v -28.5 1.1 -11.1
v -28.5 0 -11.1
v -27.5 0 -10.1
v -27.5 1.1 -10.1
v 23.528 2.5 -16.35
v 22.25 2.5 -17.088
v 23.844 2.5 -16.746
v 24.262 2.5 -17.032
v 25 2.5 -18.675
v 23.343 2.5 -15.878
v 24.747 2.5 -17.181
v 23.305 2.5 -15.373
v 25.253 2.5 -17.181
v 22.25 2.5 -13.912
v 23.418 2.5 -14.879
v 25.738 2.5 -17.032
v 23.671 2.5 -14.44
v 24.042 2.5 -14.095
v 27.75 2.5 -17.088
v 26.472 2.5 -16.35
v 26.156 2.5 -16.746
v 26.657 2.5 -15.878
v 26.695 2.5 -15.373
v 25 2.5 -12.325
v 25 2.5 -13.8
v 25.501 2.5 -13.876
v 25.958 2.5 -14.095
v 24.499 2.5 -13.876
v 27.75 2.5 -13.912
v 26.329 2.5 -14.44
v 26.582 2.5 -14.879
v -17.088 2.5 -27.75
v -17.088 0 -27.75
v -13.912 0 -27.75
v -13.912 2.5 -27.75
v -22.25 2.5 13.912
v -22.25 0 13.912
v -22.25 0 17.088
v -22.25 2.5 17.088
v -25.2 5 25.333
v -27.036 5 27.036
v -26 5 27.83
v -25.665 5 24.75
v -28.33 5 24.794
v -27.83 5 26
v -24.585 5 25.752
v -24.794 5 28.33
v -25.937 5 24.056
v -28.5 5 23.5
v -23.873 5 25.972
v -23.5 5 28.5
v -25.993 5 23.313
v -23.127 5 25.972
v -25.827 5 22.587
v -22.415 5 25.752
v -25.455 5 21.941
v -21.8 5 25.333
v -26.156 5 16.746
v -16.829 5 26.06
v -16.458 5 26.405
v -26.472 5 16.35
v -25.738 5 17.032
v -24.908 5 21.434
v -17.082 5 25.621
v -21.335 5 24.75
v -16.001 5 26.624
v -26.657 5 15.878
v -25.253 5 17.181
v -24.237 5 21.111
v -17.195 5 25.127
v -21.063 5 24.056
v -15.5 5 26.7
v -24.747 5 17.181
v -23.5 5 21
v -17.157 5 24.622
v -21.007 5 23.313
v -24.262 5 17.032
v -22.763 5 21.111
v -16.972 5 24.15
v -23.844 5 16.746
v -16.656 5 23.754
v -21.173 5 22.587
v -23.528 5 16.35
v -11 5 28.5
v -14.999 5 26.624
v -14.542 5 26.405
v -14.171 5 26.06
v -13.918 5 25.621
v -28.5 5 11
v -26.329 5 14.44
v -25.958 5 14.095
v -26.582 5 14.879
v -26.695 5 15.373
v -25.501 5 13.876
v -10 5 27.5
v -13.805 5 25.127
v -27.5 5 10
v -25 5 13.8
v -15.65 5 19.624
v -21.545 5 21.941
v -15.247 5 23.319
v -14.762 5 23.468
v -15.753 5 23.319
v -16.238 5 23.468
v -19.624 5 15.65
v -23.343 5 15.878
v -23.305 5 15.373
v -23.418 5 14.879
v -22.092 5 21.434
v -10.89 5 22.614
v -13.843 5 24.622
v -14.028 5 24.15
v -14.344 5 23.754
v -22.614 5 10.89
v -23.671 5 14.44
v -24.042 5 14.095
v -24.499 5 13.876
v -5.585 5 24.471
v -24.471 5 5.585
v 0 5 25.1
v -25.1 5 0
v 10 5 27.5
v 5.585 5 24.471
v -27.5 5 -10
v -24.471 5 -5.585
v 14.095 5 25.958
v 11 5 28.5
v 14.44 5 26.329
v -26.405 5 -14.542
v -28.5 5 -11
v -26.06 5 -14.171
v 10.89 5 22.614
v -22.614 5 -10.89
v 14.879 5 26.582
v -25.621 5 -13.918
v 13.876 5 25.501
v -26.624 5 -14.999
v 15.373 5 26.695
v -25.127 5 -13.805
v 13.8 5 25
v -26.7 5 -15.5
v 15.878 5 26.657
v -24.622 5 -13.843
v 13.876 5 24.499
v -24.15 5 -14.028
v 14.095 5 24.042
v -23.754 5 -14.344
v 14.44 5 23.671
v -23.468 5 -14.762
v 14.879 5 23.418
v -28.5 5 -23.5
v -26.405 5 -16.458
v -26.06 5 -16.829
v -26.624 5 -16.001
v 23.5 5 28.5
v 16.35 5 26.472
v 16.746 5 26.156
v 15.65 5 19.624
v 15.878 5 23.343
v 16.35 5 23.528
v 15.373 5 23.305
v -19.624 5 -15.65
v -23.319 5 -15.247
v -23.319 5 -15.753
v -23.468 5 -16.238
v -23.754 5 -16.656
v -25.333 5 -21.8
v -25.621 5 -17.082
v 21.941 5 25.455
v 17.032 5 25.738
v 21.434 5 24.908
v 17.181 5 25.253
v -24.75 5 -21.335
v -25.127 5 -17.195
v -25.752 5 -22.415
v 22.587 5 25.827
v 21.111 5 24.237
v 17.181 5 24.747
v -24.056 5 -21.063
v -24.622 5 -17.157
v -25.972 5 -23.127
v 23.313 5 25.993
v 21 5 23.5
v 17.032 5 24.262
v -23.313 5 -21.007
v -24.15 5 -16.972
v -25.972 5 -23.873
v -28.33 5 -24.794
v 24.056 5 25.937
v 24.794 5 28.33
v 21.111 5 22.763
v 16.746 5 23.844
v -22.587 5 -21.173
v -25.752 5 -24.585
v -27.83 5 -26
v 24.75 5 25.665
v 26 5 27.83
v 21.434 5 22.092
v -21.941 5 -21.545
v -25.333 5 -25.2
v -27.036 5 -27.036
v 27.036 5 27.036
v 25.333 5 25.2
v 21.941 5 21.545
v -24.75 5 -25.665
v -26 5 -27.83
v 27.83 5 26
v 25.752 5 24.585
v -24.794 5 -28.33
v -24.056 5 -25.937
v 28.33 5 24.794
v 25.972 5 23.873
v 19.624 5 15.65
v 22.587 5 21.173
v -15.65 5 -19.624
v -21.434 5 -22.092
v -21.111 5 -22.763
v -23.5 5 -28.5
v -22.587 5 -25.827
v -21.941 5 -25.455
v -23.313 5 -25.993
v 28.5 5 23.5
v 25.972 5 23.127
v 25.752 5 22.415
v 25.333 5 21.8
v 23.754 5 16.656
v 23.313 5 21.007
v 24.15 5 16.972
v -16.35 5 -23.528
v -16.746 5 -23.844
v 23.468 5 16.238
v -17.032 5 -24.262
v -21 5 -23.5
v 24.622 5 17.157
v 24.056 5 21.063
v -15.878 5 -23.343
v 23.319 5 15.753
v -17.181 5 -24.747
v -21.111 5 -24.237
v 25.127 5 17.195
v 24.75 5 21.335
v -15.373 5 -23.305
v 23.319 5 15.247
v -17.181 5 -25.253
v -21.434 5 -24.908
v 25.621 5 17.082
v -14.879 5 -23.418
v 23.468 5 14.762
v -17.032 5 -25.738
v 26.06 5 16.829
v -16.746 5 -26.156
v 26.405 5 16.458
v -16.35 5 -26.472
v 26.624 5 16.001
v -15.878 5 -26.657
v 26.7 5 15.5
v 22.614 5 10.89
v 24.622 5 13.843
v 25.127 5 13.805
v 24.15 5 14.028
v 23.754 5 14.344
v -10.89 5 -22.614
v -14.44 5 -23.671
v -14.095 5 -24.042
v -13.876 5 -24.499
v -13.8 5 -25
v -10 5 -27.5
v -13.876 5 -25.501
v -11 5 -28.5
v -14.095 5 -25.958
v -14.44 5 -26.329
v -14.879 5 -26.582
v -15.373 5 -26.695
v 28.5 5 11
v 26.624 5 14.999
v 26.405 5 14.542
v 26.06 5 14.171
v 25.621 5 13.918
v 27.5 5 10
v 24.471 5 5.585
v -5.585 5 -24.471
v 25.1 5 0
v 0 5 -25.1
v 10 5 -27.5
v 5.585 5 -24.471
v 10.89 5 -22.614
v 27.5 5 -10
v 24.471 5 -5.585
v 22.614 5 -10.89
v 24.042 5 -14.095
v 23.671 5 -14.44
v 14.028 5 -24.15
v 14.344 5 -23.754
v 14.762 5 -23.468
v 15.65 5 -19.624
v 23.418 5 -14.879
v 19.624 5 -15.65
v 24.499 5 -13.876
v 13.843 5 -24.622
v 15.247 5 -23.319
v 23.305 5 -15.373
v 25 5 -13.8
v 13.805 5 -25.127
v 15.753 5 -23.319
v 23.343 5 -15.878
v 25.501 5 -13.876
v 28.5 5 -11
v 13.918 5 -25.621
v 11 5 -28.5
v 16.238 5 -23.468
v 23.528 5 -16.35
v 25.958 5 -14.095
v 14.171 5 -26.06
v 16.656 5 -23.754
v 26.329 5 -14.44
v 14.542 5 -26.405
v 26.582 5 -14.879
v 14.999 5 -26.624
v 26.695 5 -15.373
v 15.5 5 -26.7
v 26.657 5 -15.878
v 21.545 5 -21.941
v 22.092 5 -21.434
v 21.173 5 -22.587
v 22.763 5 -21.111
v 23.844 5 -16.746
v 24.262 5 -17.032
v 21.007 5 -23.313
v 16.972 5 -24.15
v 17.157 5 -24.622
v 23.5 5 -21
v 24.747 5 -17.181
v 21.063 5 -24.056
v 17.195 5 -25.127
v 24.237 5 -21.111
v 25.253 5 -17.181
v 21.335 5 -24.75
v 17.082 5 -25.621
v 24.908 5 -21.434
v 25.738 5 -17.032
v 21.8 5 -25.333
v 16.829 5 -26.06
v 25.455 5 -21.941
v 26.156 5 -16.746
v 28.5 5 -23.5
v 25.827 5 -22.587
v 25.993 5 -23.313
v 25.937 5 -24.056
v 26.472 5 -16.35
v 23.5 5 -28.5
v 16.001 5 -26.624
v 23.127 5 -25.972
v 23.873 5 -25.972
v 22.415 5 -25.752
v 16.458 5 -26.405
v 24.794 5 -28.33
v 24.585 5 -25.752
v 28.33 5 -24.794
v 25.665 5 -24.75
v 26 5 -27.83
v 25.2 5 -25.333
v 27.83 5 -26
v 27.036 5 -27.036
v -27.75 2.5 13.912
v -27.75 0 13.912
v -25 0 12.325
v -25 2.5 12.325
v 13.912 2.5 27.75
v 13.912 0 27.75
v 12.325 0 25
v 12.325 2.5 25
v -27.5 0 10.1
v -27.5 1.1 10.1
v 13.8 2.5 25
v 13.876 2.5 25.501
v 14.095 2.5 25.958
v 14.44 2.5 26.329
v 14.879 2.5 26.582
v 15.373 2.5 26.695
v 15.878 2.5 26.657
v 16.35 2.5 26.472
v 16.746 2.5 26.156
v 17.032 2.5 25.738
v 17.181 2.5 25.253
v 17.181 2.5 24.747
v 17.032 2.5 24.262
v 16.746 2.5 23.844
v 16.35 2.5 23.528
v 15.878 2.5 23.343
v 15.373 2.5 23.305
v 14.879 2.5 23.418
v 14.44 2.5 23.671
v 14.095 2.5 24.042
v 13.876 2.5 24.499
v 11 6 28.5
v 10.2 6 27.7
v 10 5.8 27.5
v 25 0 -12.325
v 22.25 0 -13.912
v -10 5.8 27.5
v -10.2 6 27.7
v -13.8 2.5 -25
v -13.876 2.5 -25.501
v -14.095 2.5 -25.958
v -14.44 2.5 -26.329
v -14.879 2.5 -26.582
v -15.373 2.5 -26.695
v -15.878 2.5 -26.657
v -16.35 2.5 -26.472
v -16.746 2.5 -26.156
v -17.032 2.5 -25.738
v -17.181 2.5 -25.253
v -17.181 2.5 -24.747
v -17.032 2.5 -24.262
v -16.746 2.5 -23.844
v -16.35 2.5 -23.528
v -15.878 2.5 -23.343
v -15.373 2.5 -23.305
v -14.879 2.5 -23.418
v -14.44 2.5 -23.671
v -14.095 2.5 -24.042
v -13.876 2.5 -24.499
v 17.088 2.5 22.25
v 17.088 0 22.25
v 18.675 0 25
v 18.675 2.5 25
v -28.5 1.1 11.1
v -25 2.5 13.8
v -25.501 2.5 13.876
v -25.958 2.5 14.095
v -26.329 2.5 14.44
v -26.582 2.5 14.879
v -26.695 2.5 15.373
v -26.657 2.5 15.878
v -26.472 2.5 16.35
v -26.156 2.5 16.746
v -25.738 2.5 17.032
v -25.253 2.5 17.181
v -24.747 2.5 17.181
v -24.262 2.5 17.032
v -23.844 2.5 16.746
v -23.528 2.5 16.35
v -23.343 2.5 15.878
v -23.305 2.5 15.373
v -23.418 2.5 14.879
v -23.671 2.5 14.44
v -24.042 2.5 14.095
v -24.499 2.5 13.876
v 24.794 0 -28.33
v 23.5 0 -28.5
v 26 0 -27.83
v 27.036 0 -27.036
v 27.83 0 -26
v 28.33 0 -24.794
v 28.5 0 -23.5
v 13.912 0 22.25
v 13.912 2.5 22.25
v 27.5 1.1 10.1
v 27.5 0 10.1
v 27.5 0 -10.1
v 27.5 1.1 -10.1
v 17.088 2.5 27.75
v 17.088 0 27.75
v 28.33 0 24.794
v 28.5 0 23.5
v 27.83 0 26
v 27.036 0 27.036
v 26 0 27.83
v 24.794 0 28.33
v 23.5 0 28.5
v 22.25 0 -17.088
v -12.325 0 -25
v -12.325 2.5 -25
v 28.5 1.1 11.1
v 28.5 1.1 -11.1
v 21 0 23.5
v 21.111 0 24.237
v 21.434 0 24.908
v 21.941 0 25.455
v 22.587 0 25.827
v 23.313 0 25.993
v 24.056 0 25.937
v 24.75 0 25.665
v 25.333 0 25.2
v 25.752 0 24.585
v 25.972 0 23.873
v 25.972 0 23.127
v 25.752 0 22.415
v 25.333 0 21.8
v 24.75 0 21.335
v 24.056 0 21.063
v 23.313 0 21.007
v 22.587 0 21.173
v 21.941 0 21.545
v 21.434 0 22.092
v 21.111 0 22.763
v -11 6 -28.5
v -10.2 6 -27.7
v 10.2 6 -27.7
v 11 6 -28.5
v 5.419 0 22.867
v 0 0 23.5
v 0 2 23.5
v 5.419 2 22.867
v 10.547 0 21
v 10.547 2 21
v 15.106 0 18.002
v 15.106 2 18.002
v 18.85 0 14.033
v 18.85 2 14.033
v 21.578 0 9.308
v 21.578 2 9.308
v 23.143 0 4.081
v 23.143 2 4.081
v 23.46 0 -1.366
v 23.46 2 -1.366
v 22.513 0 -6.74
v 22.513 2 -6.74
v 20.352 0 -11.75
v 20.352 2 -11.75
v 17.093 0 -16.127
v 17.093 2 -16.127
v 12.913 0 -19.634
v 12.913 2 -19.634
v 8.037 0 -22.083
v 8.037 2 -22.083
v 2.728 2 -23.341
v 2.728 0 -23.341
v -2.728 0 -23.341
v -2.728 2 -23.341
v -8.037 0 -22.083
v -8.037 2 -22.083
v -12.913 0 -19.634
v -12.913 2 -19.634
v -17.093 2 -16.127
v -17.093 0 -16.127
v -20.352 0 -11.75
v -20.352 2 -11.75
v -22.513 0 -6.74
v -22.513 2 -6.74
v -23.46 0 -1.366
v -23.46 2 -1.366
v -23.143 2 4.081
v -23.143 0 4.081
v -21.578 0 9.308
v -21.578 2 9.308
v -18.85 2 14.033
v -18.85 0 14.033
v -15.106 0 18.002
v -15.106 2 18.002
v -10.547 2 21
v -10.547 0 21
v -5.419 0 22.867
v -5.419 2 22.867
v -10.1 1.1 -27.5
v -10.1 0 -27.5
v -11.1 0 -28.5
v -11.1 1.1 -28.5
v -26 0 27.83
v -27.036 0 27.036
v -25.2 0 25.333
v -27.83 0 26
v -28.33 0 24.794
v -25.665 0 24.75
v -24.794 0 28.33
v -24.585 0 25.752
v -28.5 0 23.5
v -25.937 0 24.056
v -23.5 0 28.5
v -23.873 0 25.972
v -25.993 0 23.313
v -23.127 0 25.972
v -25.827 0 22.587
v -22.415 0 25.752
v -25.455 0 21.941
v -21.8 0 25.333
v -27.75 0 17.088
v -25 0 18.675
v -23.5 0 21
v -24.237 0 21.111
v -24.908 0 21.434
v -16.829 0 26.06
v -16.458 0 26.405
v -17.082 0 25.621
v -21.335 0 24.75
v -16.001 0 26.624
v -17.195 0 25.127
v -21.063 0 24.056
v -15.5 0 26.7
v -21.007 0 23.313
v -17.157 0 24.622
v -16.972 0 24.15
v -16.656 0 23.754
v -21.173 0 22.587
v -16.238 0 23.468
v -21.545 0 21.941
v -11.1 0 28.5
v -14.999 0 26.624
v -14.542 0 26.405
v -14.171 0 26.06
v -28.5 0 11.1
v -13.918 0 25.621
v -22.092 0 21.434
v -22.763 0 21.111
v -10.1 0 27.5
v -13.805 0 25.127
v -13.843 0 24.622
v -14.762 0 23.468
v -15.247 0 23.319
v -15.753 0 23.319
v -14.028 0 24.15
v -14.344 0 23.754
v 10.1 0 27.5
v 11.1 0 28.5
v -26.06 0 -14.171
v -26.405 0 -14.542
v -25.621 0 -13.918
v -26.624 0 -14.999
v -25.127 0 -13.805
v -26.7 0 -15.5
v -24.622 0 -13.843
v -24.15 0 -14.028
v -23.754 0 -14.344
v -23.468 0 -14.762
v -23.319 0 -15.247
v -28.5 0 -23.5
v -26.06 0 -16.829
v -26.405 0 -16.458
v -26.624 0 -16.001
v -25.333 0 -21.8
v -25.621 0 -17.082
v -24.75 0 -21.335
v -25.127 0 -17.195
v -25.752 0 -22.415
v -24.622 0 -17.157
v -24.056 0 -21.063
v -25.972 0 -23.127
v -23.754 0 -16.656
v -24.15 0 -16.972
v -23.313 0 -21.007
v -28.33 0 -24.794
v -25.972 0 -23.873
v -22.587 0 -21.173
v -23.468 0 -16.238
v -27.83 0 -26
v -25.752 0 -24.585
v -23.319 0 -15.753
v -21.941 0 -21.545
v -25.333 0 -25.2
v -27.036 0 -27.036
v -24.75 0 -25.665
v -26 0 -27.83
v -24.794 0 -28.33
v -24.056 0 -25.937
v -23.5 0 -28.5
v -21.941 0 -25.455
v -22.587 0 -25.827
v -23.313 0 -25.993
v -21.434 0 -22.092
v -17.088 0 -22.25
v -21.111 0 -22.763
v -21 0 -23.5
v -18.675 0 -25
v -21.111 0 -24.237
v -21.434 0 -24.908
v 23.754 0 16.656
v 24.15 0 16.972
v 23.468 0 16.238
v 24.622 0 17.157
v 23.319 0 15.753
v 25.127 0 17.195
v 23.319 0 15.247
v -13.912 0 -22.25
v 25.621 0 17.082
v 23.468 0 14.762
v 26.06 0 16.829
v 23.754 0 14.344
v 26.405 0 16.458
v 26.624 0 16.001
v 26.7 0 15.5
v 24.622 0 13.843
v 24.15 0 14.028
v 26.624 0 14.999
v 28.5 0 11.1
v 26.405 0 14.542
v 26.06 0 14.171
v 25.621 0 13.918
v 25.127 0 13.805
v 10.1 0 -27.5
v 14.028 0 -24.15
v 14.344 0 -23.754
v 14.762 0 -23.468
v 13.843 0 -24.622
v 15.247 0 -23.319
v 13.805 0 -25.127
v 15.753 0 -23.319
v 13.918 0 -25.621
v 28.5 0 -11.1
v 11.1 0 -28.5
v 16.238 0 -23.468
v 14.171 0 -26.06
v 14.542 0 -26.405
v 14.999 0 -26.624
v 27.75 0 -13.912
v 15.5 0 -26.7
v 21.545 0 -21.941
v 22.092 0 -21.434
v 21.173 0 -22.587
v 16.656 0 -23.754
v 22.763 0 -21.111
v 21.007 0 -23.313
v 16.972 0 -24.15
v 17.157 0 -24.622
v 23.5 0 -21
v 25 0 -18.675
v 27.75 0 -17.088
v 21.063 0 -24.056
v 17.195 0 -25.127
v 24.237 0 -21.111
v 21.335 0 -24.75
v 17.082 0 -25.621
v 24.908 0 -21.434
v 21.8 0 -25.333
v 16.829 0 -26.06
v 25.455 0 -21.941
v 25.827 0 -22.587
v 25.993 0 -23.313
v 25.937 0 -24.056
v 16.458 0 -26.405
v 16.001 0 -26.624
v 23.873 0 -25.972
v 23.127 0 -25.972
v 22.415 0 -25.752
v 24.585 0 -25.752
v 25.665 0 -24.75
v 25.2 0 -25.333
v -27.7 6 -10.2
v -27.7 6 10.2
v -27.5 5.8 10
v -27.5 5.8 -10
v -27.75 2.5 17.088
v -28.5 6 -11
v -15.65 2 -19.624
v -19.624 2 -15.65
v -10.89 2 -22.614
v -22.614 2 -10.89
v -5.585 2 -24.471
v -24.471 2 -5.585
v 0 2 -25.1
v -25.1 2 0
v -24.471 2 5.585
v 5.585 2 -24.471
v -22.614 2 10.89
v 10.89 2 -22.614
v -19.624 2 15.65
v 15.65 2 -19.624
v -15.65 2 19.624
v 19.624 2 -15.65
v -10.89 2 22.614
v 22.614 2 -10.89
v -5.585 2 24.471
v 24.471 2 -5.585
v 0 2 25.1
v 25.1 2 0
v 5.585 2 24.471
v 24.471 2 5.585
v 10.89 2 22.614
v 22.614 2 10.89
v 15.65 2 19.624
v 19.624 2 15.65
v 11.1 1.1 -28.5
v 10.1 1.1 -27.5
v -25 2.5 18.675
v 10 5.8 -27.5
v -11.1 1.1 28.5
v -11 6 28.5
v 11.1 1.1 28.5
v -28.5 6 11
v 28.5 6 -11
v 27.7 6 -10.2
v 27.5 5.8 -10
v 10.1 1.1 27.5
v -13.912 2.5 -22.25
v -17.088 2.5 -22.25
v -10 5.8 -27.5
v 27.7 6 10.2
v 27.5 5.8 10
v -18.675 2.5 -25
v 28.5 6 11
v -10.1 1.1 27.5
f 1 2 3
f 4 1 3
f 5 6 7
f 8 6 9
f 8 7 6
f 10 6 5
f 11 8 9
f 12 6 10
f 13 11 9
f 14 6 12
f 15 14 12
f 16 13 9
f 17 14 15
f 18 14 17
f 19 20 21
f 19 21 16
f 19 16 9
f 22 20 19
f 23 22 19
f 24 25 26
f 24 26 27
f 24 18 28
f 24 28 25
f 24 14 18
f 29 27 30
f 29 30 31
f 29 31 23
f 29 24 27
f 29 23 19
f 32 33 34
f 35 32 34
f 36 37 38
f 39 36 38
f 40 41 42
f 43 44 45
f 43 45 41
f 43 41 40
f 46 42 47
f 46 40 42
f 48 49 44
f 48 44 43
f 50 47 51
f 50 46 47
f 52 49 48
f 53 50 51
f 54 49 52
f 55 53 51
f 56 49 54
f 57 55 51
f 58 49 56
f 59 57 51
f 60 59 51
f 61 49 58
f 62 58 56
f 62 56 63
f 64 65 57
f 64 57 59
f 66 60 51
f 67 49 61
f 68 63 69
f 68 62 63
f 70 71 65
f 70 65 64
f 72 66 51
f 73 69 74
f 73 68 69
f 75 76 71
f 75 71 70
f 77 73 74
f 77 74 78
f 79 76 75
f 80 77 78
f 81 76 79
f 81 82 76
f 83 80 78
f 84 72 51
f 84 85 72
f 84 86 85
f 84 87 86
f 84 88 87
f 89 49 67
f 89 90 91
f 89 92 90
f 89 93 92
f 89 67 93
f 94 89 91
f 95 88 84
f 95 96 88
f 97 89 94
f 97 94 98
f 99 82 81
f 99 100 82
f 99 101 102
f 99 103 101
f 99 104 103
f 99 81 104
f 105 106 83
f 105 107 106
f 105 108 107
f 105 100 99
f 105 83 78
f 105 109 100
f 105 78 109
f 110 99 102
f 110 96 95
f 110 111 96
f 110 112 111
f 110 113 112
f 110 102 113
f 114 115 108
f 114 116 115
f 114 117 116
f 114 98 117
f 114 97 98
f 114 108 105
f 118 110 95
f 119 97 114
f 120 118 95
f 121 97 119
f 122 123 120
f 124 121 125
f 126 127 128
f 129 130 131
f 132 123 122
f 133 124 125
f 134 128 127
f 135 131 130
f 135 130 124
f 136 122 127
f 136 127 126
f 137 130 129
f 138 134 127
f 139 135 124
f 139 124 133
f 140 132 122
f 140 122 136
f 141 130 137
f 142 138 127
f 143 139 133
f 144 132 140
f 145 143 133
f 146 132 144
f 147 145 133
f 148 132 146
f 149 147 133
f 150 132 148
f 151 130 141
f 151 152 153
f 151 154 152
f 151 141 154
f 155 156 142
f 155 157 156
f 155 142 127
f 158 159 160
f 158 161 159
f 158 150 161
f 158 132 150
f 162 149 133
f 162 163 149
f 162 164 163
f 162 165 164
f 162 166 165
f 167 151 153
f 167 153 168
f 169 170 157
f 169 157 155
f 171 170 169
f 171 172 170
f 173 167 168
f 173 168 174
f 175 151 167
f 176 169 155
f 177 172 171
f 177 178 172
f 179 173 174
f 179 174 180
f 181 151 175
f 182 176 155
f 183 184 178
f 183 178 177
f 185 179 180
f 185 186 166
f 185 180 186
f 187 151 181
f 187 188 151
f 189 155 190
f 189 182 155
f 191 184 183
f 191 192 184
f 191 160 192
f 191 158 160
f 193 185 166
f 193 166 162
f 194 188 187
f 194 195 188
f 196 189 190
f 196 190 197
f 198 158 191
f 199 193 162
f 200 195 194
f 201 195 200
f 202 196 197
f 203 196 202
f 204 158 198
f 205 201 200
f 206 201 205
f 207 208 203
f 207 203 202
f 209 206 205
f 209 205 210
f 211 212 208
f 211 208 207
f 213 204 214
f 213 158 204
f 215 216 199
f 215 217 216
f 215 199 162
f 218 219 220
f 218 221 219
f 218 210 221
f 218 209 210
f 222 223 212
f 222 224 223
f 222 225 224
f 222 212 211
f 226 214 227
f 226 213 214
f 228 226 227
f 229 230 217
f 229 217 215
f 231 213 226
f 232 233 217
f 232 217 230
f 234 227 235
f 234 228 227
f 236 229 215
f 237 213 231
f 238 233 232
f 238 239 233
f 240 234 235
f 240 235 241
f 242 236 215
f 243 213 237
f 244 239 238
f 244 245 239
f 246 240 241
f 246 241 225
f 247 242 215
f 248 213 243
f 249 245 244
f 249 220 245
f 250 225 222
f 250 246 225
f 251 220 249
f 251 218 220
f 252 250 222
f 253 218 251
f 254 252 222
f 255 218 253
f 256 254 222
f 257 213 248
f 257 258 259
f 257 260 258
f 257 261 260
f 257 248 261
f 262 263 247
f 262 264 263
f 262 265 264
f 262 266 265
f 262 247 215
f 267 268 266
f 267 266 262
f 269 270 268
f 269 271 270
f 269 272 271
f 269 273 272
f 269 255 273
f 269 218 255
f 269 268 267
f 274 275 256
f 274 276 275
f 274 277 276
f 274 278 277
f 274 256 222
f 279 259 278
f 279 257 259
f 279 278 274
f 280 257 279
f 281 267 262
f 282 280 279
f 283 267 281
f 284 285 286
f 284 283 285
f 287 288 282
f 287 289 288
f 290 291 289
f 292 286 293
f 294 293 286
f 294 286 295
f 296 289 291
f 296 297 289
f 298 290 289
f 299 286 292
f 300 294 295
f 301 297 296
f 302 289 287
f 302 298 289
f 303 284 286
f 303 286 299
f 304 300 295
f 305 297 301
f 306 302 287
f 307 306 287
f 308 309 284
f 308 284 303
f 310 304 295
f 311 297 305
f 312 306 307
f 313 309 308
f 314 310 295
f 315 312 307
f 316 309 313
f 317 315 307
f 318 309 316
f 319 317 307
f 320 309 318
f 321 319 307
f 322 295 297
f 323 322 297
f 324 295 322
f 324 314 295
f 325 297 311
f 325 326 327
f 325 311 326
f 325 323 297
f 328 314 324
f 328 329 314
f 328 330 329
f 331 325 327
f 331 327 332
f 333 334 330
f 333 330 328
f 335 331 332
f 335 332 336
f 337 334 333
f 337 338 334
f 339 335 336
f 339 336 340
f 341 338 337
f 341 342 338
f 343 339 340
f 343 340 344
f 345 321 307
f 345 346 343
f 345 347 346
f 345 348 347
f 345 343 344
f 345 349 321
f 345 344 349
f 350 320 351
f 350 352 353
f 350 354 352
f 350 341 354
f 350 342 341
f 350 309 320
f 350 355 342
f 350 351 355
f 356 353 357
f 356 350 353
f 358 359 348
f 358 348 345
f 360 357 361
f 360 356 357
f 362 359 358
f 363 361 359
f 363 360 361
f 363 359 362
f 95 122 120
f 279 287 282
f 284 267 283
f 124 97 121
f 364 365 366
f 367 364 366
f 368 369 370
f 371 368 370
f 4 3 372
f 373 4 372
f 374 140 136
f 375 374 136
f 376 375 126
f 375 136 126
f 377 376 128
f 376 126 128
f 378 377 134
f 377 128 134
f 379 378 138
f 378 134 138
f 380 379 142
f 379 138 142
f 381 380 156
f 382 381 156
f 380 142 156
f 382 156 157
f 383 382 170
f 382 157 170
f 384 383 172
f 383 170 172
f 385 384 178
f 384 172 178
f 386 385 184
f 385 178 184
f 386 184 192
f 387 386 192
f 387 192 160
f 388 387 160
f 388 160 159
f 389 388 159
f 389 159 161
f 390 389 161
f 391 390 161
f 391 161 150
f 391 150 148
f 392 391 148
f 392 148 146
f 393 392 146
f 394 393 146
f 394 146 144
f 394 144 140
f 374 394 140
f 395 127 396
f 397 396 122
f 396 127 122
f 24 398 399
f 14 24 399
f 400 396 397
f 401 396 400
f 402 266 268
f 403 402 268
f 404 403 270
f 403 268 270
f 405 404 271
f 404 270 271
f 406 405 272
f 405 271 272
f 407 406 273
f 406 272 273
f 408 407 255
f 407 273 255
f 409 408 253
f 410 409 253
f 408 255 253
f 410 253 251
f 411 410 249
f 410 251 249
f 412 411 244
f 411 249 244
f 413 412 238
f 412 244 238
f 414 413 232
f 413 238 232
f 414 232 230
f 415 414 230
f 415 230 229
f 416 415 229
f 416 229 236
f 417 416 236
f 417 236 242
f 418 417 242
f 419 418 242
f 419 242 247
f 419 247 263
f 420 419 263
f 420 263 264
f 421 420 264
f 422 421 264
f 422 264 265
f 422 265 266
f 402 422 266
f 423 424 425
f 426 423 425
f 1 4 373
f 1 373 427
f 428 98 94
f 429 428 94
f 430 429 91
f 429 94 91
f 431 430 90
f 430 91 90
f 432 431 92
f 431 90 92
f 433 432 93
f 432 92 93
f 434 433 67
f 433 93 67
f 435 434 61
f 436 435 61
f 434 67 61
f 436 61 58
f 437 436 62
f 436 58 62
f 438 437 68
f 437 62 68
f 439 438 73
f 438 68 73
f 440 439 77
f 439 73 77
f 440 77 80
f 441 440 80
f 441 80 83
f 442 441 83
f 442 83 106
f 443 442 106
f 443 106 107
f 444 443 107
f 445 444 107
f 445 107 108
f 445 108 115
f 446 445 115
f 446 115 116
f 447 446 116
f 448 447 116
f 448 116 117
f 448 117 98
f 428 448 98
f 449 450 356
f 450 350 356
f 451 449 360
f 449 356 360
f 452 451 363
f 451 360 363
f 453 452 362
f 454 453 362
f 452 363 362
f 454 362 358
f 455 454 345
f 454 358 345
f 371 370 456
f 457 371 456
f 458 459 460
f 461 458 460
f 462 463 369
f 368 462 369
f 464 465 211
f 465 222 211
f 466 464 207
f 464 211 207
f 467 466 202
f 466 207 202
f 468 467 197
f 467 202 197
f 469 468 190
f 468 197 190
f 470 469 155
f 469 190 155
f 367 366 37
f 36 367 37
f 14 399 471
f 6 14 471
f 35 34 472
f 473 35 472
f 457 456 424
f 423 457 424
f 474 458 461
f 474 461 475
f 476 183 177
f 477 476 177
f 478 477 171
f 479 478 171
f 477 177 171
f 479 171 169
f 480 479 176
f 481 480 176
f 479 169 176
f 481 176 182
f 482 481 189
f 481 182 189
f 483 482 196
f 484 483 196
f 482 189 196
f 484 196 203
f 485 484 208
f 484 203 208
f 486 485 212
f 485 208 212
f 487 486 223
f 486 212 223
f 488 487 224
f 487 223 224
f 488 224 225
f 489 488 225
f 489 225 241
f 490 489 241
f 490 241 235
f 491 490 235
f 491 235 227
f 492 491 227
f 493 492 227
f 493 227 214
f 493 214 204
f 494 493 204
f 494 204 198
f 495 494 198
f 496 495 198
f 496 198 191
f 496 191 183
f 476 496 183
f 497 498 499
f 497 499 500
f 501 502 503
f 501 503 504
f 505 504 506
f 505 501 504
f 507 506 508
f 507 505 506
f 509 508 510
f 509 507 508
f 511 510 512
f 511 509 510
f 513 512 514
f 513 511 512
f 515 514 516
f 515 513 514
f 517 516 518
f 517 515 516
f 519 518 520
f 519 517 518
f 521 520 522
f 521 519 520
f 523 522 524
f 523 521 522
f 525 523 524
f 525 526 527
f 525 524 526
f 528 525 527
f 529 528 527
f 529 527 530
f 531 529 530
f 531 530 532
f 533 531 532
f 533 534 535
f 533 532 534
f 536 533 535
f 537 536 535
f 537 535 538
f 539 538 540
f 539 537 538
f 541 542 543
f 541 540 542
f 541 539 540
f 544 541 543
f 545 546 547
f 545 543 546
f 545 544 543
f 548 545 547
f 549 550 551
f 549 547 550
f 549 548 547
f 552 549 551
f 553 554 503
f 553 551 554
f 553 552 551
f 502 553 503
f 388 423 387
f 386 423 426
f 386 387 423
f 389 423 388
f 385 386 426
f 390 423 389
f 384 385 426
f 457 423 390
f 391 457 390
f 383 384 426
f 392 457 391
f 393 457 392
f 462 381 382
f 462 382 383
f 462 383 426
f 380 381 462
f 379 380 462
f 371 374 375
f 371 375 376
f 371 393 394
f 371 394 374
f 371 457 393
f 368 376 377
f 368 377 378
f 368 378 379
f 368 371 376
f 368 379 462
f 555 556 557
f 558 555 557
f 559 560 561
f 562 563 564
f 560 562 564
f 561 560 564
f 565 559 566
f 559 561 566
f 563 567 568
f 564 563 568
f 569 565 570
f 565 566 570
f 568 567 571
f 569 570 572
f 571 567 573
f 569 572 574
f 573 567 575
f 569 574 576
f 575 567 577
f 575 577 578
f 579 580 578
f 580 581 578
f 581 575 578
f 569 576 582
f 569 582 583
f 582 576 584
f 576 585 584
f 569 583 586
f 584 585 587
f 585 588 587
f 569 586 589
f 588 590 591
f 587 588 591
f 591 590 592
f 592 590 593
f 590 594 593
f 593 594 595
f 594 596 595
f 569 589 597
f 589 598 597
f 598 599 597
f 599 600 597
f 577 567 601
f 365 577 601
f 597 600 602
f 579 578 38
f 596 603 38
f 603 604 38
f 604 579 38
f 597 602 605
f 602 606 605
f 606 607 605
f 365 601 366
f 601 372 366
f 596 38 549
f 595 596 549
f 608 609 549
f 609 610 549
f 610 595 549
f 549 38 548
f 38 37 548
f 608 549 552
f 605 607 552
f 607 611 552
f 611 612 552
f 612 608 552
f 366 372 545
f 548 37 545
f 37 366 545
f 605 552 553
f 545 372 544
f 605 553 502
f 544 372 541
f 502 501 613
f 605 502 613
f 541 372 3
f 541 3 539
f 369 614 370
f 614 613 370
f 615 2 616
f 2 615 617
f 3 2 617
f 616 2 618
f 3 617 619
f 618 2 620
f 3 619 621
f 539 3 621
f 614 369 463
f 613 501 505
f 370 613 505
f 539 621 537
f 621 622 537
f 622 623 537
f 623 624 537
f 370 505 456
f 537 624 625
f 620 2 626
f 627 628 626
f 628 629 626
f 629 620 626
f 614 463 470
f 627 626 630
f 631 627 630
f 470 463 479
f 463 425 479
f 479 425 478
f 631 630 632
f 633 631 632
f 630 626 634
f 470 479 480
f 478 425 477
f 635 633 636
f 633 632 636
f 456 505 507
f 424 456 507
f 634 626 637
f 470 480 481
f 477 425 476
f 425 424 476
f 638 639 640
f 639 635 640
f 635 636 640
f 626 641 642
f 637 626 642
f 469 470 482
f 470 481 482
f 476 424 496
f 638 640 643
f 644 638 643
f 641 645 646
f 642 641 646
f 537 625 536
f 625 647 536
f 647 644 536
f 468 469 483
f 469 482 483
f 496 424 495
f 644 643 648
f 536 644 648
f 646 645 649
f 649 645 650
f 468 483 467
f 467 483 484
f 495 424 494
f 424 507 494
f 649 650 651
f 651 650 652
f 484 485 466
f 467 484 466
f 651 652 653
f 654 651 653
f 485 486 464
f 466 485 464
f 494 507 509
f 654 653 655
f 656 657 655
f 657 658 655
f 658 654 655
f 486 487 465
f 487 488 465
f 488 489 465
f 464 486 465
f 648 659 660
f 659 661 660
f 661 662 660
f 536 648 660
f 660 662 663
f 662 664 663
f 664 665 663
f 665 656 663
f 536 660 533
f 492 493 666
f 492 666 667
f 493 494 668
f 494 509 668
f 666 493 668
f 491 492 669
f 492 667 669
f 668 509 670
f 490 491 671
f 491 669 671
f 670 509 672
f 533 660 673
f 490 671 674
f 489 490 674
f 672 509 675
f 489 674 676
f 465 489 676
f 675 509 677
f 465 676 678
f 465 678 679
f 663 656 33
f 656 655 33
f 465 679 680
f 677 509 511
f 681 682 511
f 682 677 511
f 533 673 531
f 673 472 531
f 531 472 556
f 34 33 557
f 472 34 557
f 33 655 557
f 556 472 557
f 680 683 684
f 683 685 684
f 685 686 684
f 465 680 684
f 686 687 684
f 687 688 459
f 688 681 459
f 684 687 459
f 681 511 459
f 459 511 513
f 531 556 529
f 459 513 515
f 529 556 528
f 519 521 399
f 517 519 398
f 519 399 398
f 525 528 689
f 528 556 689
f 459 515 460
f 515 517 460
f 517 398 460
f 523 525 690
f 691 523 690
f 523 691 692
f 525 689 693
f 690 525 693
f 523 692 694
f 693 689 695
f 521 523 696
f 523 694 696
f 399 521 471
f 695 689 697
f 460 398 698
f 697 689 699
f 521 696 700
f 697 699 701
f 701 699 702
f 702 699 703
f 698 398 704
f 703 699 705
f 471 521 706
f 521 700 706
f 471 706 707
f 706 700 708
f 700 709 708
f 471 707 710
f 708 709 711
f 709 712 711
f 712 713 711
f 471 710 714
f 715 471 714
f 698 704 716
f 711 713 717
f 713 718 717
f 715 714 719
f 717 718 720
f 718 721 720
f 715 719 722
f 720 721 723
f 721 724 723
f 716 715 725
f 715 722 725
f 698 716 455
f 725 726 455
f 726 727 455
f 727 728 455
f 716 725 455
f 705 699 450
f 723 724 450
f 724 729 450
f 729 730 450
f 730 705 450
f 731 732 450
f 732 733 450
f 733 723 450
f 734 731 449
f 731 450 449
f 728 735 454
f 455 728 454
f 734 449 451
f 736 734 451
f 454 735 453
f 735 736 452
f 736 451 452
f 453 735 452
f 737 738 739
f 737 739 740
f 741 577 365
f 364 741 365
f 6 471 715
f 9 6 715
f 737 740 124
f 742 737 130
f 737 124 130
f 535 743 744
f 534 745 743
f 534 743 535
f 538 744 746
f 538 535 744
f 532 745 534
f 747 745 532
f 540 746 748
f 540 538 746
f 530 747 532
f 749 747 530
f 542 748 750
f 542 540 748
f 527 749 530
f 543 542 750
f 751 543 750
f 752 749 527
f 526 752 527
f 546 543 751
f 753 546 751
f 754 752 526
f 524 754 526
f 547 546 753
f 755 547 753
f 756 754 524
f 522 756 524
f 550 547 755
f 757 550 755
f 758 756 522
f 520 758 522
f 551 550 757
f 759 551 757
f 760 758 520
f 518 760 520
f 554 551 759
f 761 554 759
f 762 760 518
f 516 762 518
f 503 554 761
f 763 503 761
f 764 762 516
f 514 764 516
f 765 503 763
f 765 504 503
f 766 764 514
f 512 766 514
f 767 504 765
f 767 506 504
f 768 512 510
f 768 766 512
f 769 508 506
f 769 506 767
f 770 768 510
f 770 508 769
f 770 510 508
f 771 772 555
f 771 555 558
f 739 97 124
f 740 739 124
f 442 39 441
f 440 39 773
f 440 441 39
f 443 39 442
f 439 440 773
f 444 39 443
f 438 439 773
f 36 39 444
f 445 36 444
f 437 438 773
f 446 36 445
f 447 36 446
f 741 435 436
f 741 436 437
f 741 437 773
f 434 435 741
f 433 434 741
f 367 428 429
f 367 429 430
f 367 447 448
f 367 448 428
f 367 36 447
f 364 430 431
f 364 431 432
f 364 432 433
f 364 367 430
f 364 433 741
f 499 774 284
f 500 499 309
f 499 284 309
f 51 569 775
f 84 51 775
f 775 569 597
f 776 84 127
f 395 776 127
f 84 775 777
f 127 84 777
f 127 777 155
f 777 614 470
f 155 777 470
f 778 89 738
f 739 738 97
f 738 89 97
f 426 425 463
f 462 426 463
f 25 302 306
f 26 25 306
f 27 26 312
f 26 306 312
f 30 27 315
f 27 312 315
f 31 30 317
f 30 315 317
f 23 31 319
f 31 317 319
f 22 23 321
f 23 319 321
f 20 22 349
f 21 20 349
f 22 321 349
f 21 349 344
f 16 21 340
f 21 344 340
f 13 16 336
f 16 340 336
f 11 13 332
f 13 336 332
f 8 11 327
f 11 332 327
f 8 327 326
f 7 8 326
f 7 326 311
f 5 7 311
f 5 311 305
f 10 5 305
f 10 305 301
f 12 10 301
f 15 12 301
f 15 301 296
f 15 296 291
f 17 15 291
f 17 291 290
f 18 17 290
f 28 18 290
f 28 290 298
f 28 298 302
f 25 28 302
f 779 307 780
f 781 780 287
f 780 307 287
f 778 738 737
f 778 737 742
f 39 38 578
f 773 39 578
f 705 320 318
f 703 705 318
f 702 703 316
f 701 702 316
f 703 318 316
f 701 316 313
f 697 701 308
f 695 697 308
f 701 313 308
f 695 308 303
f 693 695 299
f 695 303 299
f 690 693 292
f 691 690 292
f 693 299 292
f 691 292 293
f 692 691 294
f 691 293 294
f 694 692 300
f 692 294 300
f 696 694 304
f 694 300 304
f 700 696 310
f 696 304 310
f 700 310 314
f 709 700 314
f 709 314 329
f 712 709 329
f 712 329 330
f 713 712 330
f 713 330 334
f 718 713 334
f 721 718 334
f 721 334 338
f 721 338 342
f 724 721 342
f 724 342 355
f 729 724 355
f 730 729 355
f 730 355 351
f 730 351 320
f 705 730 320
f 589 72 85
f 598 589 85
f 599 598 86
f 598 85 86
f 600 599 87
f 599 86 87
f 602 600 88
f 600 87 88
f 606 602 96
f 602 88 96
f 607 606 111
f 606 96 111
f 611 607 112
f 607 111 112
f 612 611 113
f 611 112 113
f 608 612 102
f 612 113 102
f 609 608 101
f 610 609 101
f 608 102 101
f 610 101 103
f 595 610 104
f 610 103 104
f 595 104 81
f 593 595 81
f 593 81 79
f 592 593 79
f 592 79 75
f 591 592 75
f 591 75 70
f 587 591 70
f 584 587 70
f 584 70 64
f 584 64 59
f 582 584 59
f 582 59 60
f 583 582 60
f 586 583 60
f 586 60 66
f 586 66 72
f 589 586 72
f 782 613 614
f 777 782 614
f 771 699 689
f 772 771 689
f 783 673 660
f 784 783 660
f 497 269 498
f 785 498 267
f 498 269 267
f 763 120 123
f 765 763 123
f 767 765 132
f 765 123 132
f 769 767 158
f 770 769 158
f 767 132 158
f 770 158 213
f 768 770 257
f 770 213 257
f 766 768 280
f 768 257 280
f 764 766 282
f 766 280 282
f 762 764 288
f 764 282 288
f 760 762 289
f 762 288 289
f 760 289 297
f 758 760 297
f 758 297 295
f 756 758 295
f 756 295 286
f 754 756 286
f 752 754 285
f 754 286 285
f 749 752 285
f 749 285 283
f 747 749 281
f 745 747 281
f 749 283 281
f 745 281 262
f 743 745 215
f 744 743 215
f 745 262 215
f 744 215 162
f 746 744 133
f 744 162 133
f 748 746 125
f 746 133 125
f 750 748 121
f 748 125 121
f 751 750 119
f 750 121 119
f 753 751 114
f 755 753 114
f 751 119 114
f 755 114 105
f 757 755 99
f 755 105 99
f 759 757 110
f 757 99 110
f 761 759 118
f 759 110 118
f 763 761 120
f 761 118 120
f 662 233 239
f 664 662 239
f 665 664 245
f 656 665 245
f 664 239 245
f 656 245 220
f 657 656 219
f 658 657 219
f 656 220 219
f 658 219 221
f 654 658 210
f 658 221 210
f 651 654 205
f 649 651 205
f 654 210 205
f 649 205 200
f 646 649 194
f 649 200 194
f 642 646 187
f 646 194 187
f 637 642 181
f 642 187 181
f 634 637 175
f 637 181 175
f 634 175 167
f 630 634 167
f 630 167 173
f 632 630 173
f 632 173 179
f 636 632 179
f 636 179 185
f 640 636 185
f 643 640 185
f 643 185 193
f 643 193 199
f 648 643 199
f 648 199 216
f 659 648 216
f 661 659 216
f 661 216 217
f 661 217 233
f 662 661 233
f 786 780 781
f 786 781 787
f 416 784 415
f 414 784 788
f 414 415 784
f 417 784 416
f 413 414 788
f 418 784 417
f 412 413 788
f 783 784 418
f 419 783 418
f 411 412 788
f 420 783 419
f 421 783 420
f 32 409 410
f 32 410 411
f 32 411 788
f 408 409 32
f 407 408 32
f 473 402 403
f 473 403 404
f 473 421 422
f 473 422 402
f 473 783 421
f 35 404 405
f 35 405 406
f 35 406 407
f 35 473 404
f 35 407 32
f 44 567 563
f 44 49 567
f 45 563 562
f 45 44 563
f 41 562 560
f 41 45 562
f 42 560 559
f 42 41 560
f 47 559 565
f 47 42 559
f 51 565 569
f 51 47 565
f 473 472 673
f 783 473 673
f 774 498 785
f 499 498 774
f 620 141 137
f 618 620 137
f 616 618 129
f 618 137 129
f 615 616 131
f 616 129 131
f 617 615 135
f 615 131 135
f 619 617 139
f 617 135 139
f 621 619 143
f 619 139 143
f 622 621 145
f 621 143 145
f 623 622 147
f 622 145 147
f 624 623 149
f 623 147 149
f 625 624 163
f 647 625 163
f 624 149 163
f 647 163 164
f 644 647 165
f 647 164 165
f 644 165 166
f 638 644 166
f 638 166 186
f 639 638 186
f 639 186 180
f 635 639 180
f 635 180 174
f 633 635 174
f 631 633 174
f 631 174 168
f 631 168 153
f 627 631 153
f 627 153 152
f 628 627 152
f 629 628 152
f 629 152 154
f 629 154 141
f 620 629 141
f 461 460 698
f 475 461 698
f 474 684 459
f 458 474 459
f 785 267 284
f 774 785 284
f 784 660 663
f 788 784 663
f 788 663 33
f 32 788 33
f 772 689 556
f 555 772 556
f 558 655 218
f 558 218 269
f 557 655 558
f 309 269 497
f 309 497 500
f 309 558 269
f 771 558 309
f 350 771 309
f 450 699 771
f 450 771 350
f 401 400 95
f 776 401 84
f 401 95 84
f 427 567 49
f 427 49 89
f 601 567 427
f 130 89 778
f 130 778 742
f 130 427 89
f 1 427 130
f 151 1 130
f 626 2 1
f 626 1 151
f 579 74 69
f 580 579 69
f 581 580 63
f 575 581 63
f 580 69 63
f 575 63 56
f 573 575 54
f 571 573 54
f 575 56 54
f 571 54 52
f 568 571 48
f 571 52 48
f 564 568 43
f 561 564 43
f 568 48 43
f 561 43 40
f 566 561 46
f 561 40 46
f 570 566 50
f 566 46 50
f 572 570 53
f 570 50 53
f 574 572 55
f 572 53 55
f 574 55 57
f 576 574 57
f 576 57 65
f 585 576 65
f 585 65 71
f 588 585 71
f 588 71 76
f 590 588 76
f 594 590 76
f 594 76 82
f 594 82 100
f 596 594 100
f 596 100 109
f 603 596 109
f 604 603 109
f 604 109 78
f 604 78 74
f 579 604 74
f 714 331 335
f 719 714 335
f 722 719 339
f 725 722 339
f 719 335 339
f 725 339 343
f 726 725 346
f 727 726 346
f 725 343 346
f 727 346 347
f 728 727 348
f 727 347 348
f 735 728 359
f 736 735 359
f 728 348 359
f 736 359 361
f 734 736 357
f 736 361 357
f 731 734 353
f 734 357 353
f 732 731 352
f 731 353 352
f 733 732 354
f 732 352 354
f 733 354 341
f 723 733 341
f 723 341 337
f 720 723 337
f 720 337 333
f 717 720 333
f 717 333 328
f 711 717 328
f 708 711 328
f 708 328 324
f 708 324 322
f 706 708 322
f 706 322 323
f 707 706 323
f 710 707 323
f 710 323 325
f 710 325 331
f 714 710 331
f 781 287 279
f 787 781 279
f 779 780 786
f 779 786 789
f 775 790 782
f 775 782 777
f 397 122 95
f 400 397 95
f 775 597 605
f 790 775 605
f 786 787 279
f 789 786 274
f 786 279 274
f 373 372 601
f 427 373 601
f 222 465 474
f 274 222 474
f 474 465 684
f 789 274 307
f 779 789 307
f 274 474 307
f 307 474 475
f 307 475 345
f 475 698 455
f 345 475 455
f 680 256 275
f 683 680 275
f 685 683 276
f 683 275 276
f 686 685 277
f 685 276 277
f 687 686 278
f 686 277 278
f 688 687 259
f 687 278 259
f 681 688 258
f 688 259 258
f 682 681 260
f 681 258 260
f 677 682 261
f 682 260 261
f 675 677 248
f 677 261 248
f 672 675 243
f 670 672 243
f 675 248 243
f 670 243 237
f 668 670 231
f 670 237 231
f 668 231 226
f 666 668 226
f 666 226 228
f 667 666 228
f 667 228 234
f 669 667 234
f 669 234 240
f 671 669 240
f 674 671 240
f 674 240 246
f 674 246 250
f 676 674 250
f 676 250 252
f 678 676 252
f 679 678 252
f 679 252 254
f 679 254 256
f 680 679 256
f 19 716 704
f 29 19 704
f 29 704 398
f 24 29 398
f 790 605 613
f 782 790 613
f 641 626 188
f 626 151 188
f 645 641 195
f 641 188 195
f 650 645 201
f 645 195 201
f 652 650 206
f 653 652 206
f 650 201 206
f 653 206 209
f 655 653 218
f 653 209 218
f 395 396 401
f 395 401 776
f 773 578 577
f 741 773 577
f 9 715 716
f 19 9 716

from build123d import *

# Parameters (mm, degrees)
SKETCH_1_W                           = 57
SKETCH_1_H                           = 57
EXTRUDE_1_DEPTH                      = 5
SKETCH_2_R                           = 25.1
CUT_EXTRUDE_1_DEPTH                  = 3
CUT_EXTRUDE_5_DEPTH                  = 41.416580756
CUT_EXTRUDE_5_DEPTH_BACK             = 41.416580756
SKETCH_8_R                           = 23.5
SKETCH_3_R                           = 2.5
SKETCH_3_R_2                         = 1.7
CUT_EXTRUDE_2_DEPTH                  = 41.614036982
CUT_EXTRUDE_4_DEPTH                  = 2.5
EXTRUDE_2_DEPTH                      = 1
CHAMFER_1_SIZE                       = 0.2
CUT_EXTRUDE_3_DEPTH                  = 1.1
PATTERN_CIRCULAR_1_COUNT             = 4
CHAMFER_1_OF_PATTERN_CIRCULAR_1_SIZE = 0.2
FILLET_1_R                           = 5


with BuildPart() as part:
    # 草图1 → 凸台-拉伸1 (new body)
    with BuildSketch(Plane(origin=(0, 0, 0), x_dir=(1, 0, 0), z_dir=(0, 1, 0))):
        Rectangle(SKETCH_1_W, SKETCH_1_H)
    extrude(amount=EXTRUDE_1_DEPTH)

    # 草图2 → 切除-拉伸1 (cut)
    with BuildSketch(Plane(origin=(0, 5, 0), x_dir=(1, 0, 0), z_dir=(0, 1, 0))):
        with Locations(Location((0, 0, 0), (0, 0, 270))):
            Circle(SKETCH_2_R)
    extrude(amount=-CUT_EXTRUDE_1_DEPTH, mode=Mode.SUBTRACT)

    # 草图8 → 切除-拉伸5 (cut, two sides: drawn at the far end of the back side and taken through both)
    with BuildSketch(Plane(origin=(0, 2, 0), x_dir=(1, 0, 0), z_dir=(0, 1, 0)).offset(-CUT_EXTRUDE_5_DEPTH_BACK)):
        with Locations(Location((0, 0, 0), (0, 0, 270))):
            Circle(SKETCH_8_R)
    extrude(amount=CUT_EXTRUDE_5_DEPTH + CUT_EXTRUDE_5_DEPTH_BACK, mode=Mode.SUBTRACT)

    # 草图3 → 切除-拉伸2 (cut, through all)
    with BuildSketch(Plane(origin=(0, 5, 0), x_dir=(1, 0, 0), z_dir=(0, 1, 0))):
        with Locations(Location((23.5, 23.5, 0), (0, 0, 270))):
            Circle(SKETCH_3_R)
        with Locations(Location((25, 15.5, 0), (0, 0, 270))):
            Circle(SKETCH_3_R_2)
        with Locations(Location((15.5, 25, 0), (0, 0, 90))):
            Circle(SKETCH_3_R_2)
    cut_extrude_2 = extrude(amount=-CUT_EXTRUDE_2_DEPTH, mode=Mode.SUBTRACT)

    # 草图7 → 切除-拉伸4 (cut)
    with BuildSketch(Plane.XZ):
        Polygon((27.75, -13.91228676), (25, -12.324573519), (22.25, -13.91228676), (22.25, -17.08771324), (25, -18.675426481), (27.75, -17.08771324), align=None)
    cut_extrude_4 = extrude(amount=-CUT_EXTRUDE_4_DEPTH, mode=Mode.SUBTRACT)

    # 草图4 → 凸台-拉伸2 (add)
    with BuildSketch(Plane(origin=(0, 5, 0), x_dir=(1, 0, 0), z_dir=(0, 1, 0))):
        Polygon((28.5, 11), (27.5, 10), (27.5, -10), (28.5, -11), align=None)
    extrude_2 = extrude(amount=EXTRUDE_2_DEPTH)

    # 倒角1
    chamfer_1_edges = [part.edges().sort_by_distance(p)[0] for p in [
        (27.5, 6, 0),
    ]]
    chamfer(chamfer_1_edges, length=CHAMFER_1_SIZE)

    # 草图5 → 切除-拉伸3 (cut)
    with BuildSketch(Plane.XZ):
        Polygon((28.5, 11.1), (27.5, 10.1), (27.5, -10.1), (28.5, -11.1), align=None)
    cut_extrude_3 = extrude(amount=-CUT_EXTRUDE_3_DEPTH, mode=Mode.SUBTRACT)

    # 阵列(圆周)1: 切除-拉伸2, 切除-拉伸4, 凸台-拉伸2, 切除-拉伸3 ×4 about axis
    pattern_circular_1_axis = Axis((0, 0, 0), (0, 1, 0))
    add([cut_extrude_2.rotate(pattern_circular_1_axis, i * 360 / PATTERN_CIRCULAR_1_COUNT) for i in range(1, PATTERN_CIRCULAR_1_COUNT)], mode=Mode.SUBTRACT)
    add([cut_extrude_4.rotate(pattern_circular_1_axis, i * 360 / PATTERN_CIRCULAR_1_COUNT) for i in range(1, PATTERN_CIRCULAR_1_COUNT)], mode=Mode.SUBTRACT)
    add([extrude_2.rotate(pattern_circular_1_axis, i * 360 / PATTERN_CIRCULAR_1_COUNT) for i in range(1, PATTERN_CIRCULAR_1_COUNT)])
    add([cut_extrude_3.rotate(pattern_circular_1_axis, i * 360 / PATTERN_CIRCULAR_1_COUNT) for i in range(1, PATTERN_CIRCULAR_1_COUNT)], mode=Mode.SUBTRACT)

    # 倒角1 of 阵列(圆周)1
    chamfer_1_of_pattern_circular_1_edges = [part.edges().sort_by_distance(p)[0] for p in [
        (0, 6, -27.5),
        (-27.5, 6, 0),
        (0, 6, 27.5),
    ]]
    chamfer(chamfer_1_of_pattern_circular_1_edges, length=CHAMFER_1_OF_PATTERN_CIRCULAR_1_SIZE)

    # 圆角1
    fillet_1_edges = [part.edges().sort_by_distance(p)[0] for p in [
        (28.5, 2.5, 28.5),
        (-28.5, 2.5, 28.5),
        (-28.5, 2.5, -28.5),
        (28.5, 2.5, -28.5),
    ]]
    fillet(fillet_1_edges, radius=FILLET_1_R)


solid = part.part
